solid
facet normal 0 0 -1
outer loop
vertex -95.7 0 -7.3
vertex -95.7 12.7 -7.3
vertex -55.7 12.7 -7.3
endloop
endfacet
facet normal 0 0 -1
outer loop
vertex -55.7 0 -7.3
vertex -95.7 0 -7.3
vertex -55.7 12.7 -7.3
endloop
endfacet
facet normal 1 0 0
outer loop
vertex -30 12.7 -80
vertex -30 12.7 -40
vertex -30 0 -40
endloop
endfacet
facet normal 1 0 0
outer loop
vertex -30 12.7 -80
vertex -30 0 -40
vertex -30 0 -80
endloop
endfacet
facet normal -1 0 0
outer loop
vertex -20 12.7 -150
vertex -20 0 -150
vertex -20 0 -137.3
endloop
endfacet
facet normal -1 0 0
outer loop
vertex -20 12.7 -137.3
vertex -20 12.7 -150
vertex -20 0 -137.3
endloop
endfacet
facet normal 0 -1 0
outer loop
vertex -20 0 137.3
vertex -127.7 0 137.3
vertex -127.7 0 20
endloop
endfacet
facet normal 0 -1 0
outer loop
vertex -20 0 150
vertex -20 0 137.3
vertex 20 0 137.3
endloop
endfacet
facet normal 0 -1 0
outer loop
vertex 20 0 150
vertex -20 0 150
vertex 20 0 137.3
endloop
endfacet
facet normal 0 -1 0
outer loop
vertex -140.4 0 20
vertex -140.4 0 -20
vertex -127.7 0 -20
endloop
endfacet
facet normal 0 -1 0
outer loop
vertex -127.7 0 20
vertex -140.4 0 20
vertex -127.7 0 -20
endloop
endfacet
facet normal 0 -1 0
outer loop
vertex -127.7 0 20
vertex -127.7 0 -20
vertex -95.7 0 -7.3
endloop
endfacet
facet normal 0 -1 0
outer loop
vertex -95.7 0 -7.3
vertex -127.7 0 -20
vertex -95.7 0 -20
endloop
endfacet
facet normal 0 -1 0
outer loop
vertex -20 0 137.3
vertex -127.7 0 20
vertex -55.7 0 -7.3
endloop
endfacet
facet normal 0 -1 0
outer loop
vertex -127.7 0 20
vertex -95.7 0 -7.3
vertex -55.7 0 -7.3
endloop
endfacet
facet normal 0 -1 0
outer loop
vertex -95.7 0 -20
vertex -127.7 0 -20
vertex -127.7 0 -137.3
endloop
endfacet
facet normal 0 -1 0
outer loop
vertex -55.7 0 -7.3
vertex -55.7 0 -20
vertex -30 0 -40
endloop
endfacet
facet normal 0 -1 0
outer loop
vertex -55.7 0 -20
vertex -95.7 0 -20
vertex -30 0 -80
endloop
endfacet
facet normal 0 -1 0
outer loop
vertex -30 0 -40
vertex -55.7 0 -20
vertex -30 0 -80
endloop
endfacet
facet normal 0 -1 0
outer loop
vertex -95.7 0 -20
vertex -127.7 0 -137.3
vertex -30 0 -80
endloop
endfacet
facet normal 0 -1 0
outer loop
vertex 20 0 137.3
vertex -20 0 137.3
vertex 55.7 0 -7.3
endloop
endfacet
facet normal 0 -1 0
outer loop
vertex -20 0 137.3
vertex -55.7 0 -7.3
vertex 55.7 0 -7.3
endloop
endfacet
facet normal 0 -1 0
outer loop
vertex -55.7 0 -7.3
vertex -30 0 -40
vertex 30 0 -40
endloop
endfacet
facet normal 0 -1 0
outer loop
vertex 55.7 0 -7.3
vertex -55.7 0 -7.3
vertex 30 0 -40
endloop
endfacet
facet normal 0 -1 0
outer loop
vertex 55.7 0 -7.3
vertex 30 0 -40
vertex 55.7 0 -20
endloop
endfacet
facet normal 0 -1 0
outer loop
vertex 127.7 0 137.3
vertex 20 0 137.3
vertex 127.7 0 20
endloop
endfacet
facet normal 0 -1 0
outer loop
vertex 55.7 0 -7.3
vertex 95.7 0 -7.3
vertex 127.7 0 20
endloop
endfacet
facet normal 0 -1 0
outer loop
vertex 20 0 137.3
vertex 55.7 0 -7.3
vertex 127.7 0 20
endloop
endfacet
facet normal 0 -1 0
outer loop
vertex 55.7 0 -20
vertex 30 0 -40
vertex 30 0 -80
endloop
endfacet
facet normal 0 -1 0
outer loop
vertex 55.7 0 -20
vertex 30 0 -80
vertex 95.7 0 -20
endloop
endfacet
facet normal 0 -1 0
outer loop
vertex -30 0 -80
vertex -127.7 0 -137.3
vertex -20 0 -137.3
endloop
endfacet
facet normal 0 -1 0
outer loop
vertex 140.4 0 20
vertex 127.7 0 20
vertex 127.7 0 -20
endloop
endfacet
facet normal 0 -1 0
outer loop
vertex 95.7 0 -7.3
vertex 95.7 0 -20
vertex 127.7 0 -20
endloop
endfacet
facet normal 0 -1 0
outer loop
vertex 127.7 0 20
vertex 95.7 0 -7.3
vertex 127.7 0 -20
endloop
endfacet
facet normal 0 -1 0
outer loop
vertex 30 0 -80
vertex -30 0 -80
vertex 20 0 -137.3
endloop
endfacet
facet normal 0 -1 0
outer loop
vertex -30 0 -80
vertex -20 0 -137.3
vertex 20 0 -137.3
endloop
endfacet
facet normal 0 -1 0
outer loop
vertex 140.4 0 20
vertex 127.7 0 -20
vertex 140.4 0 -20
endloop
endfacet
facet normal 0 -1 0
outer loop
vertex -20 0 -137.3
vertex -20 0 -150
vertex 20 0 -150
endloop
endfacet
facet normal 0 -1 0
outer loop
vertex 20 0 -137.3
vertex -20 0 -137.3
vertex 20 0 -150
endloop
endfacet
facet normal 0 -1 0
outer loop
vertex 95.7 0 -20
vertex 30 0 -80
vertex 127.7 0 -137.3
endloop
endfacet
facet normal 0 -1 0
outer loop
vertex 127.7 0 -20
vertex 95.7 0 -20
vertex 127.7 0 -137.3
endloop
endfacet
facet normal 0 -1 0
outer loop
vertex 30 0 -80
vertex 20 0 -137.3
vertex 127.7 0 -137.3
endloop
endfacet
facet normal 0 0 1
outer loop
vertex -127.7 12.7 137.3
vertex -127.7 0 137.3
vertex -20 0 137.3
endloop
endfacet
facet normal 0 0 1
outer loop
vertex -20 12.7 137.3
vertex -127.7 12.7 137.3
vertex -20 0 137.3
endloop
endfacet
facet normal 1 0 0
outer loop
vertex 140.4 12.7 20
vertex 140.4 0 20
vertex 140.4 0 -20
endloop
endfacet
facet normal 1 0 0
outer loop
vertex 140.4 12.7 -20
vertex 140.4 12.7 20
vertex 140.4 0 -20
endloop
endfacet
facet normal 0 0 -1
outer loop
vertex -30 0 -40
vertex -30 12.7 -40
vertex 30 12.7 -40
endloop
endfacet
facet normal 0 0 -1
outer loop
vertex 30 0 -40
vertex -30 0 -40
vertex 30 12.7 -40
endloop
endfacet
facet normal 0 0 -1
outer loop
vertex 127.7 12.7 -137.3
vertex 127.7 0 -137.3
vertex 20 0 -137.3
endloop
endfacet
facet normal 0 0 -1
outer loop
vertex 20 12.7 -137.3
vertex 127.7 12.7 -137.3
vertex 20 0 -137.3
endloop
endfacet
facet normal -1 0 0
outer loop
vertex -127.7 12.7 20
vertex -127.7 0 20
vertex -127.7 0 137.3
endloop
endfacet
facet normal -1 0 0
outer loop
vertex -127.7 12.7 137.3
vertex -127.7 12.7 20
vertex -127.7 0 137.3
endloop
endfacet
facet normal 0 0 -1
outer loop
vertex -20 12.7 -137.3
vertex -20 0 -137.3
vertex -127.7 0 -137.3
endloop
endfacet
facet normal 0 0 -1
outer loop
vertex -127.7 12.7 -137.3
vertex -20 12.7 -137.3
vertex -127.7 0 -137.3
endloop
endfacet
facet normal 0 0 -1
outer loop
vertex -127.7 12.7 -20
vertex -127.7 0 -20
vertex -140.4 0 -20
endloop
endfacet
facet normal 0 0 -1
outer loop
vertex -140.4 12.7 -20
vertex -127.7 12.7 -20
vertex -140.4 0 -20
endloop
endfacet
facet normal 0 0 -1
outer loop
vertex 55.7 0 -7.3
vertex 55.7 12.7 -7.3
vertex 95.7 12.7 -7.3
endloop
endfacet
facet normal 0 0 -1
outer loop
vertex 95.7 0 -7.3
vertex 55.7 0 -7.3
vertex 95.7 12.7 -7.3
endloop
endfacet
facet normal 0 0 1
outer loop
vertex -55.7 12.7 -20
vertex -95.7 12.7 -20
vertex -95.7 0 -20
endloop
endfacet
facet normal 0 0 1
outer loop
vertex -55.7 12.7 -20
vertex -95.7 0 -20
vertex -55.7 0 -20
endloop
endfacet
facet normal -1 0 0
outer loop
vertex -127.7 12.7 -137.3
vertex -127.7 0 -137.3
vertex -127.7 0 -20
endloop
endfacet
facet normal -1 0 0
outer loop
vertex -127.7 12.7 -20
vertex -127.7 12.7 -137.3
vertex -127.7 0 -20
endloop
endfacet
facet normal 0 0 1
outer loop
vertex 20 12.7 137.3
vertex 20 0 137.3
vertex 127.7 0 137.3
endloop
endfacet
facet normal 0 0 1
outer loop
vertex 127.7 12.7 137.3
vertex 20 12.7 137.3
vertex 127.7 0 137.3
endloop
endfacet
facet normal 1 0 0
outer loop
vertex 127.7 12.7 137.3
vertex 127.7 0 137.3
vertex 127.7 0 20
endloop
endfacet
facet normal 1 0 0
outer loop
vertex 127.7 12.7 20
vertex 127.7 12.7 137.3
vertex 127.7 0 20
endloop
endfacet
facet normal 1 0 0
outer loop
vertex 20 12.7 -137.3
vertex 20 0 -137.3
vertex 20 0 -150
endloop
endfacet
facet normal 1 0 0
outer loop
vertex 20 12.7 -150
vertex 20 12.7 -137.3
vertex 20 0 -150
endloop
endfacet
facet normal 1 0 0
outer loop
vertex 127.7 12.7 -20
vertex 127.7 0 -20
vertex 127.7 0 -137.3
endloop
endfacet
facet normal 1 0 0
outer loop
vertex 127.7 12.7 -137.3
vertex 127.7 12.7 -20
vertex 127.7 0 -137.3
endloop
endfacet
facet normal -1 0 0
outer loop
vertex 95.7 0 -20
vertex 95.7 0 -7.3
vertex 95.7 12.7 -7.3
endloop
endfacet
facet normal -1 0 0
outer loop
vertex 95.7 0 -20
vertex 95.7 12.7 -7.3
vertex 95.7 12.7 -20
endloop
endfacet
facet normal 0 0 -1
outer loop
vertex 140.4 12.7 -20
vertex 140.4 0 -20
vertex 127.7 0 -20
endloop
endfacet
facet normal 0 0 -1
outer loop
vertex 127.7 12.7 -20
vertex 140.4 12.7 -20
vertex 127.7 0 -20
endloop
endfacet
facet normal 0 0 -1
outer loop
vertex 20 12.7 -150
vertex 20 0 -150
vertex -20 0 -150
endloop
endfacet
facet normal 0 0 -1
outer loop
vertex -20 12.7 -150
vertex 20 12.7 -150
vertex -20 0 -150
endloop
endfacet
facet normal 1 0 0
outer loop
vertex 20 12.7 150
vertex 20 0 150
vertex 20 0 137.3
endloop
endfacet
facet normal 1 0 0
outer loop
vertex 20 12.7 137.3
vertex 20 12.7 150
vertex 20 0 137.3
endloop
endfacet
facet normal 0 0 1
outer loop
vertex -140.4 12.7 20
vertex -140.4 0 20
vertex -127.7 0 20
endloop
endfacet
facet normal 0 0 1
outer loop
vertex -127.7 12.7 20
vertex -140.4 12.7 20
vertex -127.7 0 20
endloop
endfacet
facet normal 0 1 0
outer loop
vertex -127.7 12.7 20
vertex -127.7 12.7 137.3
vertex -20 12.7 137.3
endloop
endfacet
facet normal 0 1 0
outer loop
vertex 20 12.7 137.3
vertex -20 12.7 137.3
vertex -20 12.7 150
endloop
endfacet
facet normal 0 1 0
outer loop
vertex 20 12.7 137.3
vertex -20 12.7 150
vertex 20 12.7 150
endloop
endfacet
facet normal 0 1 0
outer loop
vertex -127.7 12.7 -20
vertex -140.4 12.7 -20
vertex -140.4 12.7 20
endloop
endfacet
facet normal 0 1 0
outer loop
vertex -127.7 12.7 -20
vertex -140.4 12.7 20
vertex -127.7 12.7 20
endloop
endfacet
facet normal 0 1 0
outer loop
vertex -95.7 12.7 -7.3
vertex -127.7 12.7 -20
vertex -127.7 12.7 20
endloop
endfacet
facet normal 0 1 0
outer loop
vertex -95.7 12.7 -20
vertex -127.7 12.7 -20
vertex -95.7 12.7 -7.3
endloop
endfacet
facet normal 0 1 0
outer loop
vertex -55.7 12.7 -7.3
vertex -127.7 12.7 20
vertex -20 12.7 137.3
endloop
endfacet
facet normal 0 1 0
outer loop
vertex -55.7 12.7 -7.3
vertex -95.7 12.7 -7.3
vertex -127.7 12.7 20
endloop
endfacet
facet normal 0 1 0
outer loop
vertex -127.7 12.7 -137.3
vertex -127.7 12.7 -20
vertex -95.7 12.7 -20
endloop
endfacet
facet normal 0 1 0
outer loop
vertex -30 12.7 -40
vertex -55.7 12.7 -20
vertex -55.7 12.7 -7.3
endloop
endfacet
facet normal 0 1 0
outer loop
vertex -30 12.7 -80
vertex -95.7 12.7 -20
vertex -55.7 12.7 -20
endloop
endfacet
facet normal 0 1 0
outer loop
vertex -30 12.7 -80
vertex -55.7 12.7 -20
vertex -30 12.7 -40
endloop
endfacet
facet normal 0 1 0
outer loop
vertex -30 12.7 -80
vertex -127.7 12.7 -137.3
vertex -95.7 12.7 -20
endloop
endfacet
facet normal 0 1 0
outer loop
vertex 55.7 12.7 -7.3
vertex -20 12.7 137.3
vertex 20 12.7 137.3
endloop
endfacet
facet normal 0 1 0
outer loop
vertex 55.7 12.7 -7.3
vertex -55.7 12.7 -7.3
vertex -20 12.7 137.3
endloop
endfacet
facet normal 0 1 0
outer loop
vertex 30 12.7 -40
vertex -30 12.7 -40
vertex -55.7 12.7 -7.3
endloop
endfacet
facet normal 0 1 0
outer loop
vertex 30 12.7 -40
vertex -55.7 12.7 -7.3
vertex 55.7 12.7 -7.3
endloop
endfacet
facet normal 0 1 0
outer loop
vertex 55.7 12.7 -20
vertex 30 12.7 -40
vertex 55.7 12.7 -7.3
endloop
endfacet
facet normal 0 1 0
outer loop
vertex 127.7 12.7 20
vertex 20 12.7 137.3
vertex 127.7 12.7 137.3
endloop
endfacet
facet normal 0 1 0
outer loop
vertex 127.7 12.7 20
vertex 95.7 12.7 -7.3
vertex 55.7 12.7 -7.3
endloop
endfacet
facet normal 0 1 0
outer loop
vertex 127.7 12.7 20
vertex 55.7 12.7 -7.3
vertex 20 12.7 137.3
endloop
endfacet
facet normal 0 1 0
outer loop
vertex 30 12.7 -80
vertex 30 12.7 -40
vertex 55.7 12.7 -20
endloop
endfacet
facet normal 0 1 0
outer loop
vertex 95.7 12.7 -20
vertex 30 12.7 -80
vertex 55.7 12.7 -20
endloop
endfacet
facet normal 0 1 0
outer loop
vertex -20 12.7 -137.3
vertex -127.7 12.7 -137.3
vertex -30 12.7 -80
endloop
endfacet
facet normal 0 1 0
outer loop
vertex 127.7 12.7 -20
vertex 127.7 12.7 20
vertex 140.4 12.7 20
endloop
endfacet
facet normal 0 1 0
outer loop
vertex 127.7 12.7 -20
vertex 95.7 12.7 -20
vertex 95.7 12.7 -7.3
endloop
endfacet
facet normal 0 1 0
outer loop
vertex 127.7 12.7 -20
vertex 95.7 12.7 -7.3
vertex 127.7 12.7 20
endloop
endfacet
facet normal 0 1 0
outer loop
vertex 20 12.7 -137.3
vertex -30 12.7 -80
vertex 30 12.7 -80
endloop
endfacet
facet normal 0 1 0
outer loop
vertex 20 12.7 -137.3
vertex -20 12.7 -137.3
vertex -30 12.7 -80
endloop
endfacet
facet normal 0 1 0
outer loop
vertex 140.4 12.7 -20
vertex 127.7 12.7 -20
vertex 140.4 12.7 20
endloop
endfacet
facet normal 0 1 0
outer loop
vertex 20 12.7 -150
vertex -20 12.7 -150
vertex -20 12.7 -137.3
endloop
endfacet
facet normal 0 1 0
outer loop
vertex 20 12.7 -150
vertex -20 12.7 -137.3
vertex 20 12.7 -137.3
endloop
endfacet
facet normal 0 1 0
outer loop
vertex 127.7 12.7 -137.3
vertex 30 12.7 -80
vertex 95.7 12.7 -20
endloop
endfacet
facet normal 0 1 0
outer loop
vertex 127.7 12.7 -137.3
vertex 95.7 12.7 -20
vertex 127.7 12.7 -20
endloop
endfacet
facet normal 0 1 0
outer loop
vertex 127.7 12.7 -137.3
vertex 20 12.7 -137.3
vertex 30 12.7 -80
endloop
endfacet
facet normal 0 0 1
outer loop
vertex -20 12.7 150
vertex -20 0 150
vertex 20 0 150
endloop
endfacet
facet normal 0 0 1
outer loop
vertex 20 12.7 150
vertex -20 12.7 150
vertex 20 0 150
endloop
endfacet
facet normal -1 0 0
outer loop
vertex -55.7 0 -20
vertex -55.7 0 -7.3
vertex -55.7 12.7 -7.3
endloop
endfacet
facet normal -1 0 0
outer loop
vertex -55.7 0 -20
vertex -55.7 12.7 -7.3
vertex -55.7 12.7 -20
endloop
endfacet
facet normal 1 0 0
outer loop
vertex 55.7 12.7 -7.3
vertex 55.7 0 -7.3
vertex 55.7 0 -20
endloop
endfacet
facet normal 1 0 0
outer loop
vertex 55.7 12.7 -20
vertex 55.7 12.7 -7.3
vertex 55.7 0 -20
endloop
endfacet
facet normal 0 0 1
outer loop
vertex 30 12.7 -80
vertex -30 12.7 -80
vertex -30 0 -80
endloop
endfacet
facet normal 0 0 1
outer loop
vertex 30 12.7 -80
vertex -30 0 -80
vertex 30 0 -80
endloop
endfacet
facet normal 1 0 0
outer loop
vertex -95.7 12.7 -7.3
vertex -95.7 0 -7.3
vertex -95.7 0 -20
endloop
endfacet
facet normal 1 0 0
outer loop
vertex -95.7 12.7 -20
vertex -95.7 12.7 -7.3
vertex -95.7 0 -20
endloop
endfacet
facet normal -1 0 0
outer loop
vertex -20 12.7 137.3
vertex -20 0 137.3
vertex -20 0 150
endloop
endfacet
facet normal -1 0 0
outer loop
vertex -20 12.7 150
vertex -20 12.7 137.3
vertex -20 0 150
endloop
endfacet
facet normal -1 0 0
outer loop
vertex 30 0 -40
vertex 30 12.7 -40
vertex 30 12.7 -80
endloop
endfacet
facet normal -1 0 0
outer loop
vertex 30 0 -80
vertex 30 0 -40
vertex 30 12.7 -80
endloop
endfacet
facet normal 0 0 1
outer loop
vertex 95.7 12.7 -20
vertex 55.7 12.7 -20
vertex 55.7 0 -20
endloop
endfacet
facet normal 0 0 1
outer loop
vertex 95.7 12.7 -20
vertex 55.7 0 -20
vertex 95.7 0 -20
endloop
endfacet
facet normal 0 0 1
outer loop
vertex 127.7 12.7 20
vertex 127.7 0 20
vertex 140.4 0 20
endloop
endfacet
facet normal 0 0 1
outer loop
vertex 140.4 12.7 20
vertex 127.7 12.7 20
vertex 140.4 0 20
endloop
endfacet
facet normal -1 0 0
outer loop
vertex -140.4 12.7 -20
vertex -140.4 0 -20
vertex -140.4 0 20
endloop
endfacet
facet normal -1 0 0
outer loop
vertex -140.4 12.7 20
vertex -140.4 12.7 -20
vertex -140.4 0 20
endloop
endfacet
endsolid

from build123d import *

# Parameters (mm, degrees)
BOSS_EXTRUDE1_DEPTH = 12.7
SKETCH2_W           = 40
SKETCH2_H           = 12.7
SKETCH2_W_2         = 60
SKETCH2_H_2         = 40
CUT_EXTRUDE1_DEPTH  = 12.7


with BuildPart() as part:
    # Sketch1 → Boss-Extrude1 (new body)
    with BuildSketch(Plane(origin=(0, 0, 0), x_dir=(1, 0, 0), z_dir=(0, 1, 0))):
        Polygon((-127.7, -137.3), (-20, -137.3), (-20, -150), (20, -150), (20, -137.3), (127.7, -137.3), (127.7, -20), (140.4, -20), (140.4, 20), (127.7, 20), (127.7, 137.3), (20, 137.3), (20, 150), (-20, 150), (-20, 137.3), (-127.7, 137.3), (-127.7, 20), (-140.4, 20), (-140.4, -20), (-127.7, -20), align=None)
    extrude(amount=BOSS_EXTRUDE1_DEPTH)

    # Sketch2 → Cut-Extrude1 (cut)
    with BuildSketch(Plane(origin=(0, 12.7, 0), x_dir=(1, 0, 0), z_dir=(0, 1, 0))):
        with Locations((-75.7, 13.65)):
            Rectangle(SKETCH2_W, SKETCH2_H)
        with Locations((75.7, 13.65)):
            Rectangle(SKETCH2_W, SKETCH2_H)
        with Locations((0, 60)):
            Rectangle(SKETCH2_W_2, SKETCH2_H_2)
    extrude(amount=-CUT_EXTRUDE1_DEPTH, mode=Mode.SUBTRACT)


solid = part.part
